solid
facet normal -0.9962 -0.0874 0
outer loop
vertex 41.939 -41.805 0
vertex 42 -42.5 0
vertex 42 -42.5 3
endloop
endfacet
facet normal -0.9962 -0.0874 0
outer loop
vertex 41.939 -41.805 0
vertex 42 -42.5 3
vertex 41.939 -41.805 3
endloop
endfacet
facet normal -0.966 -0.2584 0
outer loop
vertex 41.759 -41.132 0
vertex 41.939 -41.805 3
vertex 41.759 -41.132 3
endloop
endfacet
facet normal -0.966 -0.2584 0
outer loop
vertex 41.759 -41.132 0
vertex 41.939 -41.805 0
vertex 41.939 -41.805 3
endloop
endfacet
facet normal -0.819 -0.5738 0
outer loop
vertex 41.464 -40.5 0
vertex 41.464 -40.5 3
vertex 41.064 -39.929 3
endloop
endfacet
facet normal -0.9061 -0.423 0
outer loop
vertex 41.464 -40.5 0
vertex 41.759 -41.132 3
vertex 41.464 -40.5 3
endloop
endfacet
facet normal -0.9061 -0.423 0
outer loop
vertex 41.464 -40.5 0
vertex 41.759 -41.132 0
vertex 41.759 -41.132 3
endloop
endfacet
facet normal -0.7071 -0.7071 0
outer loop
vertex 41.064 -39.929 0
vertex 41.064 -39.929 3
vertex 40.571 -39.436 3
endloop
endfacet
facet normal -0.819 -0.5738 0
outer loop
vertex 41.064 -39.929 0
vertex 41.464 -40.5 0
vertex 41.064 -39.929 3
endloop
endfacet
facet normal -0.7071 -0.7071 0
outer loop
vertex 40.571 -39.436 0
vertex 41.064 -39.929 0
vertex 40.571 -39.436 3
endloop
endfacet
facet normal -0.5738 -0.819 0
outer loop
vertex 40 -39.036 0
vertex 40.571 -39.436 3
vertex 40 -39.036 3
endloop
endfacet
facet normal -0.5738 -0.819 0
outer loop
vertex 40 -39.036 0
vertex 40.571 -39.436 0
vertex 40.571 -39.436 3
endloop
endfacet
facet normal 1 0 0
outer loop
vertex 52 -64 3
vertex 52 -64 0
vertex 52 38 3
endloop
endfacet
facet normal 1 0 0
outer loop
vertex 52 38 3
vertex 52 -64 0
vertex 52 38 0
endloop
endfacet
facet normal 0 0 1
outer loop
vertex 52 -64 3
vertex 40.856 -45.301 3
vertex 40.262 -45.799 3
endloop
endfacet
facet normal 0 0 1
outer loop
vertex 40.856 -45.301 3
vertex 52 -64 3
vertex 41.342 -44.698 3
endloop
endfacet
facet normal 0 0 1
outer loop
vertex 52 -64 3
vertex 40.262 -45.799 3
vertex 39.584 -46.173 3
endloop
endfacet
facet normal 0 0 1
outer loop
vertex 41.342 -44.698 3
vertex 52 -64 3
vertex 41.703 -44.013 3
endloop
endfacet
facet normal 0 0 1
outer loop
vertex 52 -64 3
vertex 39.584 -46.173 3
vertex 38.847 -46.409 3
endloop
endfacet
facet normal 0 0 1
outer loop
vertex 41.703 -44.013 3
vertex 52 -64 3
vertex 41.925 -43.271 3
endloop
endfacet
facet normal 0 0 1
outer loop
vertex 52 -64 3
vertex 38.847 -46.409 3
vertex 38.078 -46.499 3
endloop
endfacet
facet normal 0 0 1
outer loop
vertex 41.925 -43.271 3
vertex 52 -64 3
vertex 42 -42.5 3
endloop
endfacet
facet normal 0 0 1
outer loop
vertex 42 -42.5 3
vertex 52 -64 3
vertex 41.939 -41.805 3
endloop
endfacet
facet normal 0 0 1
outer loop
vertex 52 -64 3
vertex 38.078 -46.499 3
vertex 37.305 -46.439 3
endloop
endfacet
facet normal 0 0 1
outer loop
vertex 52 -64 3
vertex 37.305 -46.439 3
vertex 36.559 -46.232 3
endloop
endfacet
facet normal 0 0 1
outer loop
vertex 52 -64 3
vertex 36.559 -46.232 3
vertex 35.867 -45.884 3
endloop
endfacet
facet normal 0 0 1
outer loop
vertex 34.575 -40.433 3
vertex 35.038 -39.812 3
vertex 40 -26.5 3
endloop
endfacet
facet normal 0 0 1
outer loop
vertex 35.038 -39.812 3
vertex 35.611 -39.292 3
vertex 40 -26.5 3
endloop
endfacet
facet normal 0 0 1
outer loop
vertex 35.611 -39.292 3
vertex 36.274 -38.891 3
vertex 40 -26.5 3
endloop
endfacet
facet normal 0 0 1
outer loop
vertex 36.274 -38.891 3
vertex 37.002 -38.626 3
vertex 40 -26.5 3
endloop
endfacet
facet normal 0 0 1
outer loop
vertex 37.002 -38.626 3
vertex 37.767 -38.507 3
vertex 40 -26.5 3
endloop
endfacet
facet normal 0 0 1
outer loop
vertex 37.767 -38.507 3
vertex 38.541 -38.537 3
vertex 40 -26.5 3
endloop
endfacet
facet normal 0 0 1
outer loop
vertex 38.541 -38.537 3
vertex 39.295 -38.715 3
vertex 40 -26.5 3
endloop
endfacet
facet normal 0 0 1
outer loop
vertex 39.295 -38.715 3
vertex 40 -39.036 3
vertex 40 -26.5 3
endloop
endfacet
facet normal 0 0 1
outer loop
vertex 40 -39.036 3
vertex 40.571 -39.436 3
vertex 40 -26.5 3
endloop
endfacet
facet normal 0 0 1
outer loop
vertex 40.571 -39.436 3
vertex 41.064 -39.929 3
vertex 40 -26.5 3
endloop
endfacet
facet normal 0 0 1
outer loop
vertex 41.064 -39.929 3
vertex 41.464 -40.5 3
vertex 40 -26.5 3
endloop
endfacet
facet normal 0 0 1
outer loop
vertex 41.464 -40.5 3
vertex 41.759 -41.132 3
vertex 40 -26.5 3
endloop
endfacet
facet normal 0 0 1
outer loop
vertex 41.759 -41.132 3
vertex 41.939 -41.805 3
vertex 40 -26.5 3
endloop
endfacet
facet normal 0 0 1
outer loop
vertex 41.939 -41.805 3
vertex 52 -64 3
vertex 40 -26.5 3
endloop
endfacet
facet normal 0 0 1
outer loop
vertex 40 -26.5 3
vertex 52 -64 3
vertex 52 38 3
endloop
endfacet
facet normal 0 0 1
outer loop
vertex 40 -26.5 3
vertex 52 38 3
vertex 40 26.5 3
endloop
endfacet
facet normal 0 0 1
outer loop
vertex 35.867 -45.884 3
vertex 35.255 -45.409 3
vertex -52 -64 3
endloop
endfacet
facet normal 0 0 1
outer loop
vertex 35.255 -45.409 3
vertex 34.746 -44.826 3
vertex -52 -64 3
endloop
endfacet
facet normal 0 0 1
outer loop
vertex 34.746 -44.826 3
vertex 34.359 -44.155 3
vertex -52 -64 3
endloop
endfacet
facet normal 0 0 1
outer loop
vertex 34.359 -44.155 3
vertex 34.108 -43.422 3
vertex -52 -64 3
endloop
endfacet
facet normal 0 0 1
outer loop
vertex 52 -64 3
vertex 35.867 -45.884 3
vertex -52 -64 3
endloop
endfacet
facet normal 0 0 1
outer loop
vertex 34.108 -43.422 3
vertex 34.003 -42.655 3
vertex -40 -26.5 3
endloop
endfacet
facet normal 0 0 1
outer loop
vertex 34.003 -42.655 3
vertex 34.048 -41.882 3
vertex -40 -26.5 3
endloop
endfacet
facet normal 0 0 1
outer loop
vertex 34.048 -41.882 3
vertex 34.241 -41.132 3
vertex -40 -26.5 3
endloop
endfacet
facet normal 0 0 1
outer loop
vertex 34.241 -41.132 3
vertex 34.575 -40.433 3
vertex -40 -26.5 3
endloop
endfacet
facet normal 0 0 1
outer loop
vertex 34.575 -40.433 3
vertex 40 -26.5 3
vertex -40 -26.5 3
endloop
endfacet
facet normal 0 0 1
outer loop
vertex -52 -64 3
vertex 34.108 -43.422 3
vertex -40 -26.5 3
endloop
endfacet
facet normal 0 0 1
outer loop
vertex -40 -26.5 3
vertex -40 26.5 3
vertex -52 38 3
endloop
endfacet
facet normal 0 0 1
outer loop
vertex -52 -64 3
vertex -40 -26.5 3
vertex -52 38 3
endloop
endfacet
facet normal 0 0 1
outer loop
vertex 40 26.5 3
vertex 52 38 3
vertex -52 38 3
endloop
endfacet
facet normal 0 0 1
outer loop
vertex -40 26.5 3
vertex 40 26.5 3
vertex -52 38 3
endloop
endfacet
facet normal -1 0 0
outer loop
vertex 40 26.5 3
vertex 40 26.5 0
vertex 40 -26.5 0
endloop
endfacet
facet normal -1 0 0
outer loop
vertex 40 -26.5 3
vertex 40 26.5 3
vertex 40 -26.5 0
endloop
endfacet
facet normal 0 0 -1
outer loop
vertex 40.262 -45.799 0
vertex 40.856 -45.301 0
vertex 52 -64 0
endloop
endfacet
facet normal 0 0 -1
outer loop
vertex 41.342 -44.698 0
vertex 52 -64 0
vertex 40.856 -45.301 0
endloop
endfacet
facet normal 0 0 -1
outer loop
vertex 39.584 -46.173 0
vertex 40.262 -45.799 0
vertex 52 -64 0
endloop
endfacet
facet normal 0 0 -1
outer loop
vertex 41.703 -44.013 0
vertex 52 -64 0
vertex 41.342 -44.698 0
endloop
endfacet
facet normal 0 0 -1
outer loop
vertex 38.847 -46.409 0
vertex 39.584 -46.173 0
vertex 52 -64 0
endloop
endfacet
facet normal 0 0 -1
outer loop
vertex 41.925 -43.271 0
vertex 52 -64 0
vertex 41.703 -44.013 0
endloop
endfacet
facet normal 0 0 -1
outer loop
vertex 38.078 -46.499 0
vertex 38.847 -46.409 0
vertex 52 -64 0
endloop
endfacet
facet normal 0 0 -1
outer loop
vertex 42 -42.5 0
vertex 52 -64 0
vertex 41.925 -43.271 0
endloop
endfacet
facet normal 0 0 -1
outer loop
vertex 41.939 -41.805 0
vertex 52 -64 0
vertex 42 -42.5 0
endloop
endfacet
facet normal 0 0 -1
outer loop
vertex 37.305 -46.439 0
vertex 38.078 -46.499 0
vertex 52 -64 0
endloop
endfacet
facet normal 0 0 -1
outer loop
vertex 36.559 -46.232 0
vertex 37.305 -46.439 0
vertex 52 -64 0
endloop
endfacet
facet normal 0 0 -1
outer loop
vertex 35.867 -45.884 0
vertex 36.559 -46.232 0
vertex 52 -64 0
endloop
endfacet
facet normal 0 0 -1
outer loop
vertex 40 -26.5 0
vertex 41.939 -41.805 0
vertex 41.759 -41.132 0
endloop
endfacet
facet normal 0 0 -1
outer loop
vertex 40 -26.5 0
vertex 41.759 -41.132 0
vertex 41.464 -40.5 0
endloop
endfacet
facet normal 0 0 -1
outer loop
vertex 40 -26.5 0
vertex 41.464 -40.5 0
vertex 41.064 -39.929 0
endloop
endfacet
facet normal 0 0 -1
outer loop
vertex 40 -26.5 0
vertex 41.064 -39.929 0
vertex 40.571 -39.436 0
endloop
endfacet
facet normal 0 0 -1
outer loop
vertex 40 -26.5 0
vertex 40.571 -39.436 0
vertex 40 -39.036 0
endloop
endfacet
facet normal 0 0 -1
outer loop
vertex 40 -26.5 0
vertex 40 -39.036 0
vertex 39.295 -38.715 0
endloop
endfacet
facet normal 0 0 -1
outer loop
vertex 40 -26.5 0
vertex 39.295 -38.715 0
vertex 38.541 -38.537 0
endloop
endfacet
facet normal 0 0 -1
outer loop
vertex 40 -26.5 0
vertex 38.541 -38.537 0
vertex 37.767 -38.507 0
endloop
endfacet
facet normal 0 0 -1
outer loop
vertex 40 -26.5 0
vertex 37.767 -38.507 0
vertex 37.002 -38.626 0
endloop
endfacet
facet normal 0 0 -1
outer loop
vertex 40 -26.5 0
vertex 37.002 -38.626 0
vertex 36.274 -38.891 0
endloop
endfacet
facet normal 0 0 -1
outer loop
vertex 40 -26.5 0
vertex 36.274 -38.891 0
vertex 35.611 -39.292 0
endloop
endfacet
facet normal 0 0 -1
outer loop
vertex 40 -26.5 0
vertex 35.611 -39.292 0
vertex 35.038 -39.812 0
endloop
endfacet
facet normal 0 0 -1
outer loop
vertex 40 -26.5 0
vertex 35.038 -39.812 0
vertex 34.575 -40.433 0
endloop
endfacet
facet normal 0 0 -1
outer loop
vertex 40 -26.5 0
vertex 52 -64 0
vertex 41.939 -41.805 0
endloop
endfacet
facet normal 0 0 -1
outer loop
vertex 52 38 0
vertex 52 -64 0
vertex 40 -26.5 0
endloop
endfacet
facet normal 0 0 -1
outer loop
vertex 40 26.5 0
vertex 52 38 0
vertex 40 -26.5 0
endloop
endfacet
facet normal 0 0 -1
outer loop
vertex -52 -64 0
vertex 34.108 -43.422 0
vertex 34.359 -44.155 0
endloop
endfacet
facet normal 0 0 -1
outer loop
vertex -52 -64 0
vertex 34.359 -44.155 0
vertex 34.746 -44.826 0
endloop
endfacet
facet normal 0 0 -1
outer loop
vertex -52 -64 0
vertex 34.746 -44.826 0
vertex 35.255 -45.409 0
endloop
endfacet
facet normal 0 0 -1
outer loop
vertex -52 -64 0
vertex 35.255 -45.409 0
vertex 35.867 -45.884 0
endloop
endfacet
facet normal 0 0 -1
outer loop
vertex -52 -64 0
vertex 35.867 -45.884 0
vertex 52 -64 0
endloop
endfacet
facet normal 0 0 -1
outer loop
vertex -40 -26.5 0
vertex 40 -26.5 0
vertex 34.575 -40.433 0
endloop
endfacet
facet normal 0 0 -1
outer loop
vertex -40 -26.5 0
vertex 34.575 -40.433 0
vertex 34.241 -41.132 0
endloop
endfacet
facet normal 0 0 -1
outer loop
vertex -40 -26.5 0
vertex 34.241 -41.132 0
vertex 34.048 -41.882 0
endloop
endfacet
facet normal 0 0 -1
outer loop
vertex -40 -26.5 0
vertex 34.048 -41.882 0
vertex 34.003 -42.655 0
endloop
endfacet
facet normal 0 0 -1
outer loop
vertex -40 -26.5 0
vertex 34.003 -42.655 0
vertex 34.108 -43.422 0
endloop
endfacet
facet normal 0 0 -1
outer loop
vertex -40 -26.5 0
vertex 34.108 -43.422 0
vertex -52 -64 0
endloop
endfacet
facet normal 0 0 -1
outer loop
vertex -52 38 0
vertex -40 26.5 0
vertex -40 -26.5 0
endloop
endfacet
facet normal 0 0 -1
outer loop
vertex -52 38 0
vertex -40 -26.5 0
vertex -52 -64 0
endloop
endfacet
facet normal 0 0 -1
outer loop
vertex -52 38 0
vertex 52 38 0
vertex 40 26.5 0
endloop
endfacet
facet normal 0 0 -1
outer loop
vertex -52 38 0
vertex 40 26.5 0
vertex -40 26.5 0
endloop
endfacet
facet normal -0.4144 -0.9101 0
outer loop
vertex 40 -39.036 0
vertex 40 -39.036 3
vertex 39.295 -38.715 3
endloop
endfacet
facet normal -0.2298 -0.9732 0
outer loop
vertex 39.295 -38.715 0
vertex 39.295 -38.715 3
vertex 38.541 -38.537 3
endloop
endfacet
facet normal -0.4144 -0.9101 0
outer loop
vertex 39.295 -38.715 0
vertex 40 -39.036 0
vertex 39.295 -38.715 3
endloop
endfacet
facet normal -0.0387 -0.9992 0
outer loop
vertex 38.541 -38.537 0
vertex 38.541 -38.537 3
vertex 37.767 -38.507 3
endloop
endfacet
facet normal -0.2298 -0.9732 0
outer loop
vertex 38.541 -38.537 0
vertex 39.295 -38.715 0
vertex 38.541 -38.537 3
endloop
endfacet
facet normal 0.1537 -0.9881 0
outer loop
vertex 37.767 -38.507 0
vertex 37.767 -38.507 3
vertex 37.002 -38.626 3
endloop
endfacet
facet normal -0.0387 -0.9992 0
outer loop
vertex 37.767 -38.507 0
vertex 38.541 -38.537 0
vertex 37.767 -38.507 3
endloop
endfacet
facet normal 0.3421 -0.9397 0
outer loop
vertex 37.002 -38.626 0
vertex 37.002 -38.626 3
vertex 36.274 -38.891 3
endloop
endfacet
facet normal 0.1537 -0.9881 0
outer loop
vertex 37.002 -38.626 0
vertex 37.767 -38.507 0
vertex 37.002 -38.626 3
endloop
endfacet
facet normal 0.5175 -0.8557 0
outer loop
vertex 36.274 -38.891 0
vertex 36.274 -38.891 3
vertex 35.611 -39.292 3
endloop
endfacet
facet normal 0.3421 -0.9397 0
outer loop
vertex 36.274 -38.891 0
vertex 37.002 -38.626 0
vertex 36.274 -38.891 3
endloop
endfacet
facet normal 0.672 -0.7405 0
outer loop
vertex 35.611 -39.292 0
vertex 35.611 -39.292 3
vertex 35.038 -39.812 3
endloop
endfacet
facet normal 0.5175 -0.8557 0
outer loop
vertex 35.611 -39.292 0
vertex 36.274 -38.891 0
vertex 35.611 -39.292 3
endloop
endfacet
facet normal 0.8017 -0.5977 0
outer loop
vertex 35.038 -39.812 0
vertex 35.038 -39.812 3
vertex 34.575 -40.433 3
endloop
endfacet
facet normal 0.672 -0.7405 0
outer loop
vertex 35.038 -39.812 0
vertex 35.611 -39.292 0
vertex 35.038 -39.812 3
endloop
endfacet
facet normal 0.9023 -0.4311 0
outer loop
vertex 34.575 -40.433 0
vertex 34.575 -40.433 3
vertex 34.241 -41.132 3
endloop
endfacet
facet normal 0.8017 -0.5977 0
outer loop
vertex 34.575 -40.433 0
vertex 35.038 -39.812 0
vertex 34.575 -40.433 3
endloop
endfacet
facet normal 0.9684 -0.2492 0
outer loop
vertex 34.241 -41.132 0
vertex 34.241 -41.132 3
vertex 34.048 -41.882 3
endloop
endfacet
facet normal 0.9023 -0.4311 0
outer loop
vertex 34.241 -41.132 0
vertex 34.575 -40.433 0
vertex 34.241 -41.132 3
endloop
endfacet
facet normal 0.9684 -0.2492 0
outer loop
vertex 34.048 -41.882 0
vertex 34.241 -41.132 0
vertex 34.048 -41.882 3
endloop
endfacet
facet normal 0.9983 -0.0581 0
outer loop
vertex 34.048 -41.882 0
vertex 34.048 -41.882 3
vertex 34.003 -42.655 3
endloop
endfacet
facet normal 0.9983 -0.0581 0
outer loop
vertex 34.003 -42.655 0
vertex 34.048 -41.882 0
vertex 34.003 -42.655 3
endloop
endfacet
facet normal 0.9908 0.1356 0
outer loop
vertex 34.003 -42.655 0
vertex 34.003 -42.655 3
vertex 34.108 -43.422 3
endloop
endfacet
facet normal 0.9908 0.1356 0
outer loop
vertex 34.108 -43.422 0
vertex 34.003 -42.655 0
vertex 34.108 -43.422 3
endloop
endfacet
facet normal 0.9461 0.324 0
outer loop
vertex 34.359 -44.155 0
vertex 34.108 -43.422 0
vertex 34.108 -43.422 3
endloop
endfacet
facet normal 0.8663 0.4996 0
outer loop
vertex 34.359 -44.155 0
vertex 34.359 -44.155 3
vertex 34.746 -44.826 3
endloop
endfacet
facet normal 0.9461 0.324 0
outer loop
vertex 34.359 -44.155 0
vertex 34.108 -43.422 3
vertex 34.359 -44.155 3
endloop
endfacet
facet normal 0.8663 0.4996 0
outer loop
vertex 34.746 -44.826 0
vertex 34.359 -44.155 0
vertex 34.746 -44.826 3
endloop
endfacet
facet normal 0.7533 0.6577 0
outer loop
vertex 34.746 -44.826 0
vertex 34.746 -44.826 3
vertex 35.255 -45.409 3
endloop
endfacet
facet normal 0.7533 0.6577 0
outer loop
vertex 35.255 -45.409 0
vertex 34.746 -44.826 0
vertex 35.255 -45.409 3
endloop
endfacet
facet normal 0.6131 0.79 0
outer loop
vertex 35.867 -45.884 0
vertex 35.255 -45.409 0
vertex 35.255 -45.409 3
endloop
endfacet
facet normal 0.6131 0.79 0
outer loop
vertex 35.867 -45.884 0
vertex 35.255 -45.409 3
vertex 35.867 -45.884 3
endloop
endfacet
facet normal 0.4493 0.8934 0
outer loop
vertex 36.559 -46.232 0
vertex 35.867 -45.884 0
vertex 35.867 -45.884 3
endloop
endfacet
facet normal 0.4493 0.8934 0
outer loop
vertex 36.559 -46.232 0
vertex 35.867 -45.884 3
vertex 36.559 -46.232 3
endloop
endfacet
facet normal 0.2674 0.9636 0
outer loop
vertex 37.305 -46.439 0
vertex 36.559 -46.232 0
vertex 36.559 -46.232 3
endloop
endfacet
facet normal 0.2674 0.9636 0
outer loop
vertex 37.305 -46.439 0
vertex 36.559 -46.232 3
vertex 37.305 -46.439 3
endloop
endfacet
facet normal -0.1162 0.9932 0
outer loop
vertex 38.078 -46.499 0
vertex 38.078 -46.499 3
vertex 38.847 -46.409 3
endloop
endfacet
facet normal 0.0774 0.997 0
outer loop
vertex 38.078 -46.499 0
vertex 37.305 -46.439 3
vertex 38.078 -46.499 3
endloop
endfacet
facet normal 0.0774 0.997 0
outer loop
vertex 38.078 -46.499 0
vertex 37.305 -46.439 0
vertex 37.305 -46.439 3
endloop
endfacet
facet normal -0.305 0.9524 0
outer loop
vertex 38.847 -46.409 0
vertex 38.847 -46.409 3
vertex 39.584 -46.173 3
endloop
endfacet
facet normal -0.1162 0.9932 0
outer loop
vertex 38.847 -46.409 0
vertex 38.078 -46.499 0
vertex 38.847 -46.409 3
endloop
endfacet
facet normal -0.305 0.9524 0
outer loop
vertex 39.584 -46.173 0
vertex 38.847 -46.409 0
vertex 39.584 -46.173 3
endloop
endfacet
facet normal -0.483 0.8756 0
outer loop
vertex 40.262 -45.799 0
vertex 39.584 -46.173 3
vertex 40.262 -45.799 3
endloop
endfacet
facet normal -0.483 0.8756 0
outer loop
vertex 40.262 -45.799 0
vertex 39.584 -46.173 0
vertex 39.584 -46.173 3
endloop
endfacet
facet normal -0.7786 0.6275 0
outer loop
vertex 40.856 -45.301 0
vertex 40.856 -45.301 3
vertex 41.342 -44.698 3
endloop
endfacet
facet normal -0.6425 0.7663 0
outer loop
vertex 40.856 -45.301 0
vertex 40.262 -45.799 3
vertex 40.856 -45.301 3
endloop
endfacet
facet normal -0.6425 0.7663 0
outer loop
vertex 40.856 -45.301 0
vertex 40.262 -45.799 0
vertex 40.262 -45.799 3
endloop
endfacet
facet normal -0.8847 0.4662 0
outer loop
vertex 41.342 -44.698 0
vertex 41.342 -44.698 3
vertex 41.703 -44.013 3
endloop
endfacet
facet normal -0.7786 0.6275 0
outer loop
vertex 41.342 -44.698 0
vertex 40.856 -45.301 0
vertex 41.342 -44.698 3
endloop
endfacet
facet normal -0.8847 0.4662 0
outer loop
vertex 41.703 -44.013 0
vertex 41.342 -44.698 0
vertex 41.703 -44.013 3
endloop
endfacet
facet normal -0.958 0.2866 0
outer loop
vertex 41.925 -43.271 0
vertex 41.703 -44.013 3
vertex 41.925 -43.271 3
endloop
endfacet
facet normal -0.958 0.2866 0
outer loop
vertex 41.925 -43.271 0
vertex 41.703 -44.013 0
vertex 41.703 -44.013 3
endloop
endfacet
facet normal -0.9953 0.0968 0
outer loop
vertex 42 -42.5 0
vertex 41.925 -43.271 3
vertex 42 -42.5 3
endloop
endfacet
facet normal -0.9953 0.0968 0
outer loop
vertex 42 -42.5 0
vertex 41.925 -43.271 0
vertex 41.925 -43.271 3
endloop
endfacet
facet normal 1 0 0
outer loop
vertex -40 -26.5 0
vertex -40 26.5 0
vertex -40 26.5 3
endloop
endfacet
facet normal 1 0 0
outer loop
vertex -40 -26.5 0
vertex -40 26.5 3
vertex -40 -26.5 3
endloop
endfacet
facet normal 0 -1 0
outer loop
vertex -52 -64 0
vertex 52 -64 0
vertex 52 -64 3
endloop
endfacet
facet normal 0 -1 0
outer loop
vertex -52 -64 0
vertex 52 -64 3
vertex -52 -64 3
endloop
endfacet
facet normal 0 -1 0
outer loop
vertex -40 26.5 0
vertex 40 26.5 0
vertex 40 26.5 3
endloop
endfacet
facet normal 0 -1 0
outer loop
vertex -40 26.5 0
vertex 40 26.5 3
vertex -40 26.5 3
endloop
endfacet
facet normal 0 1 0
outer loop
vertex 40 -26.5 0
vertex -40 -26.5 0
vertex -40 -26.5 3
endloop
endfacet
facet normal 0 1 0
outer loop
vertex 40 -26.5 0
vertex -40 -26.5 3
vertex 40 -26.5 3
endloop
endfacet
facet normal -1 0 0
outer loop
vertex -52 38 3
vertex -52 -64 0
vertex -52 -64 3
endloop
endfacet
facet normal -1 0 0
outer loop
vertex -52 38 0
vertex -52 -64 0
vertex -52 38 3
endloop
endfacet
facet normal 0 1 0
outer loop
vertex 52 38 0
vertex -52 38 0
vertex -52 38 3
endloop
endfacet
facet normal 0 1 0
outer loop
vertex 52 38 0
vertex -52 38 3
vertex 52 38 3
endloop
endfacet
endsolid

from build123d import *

# Parameters (mm, degrees)
F1_DEPTH = 3
F4_DEPTH = 25


with BuildPart() as f1:
    # F0 (on Top) → F1 (new body)
    with BuildSketch(Plane.XY):
        Polygon((40, 0), (40, -26.5), (0, -26.5), (0, -64), (52, -64), (52, 0), align=None)
        Polygon((40, 26.5), (40, 0), (52, 0), (52, 38), (0, 38), (0, 26.5), align=None)
    extrude(amount=F1_DEPTH)

    # F2: F1 across plane


with BuildPart() as f1_1:
    add(f1.part)
    add(f1.part.mirror(Plane.YZ))


with BuildPart() as f4:
    # F3 (on Top) → F4 (new body)
    with BuildSketch(Plane.XY):
        with BuildLine():
            ThreePointArc((40, -39.035898), (34.535898, -44.5), (42, -42.5))
            ThreePointArc((42, -42.5), (41.464102, -40.5), (40, -39.035898))
        make_face()
    extrude(amount=F4_DEPTH)


with BuildPart() as f1_2:
    add(f1_1.part)

    # F5: cut F4
    add(f4.part, mode=Mode.SUBTRACT)


solid = f1_2.part
